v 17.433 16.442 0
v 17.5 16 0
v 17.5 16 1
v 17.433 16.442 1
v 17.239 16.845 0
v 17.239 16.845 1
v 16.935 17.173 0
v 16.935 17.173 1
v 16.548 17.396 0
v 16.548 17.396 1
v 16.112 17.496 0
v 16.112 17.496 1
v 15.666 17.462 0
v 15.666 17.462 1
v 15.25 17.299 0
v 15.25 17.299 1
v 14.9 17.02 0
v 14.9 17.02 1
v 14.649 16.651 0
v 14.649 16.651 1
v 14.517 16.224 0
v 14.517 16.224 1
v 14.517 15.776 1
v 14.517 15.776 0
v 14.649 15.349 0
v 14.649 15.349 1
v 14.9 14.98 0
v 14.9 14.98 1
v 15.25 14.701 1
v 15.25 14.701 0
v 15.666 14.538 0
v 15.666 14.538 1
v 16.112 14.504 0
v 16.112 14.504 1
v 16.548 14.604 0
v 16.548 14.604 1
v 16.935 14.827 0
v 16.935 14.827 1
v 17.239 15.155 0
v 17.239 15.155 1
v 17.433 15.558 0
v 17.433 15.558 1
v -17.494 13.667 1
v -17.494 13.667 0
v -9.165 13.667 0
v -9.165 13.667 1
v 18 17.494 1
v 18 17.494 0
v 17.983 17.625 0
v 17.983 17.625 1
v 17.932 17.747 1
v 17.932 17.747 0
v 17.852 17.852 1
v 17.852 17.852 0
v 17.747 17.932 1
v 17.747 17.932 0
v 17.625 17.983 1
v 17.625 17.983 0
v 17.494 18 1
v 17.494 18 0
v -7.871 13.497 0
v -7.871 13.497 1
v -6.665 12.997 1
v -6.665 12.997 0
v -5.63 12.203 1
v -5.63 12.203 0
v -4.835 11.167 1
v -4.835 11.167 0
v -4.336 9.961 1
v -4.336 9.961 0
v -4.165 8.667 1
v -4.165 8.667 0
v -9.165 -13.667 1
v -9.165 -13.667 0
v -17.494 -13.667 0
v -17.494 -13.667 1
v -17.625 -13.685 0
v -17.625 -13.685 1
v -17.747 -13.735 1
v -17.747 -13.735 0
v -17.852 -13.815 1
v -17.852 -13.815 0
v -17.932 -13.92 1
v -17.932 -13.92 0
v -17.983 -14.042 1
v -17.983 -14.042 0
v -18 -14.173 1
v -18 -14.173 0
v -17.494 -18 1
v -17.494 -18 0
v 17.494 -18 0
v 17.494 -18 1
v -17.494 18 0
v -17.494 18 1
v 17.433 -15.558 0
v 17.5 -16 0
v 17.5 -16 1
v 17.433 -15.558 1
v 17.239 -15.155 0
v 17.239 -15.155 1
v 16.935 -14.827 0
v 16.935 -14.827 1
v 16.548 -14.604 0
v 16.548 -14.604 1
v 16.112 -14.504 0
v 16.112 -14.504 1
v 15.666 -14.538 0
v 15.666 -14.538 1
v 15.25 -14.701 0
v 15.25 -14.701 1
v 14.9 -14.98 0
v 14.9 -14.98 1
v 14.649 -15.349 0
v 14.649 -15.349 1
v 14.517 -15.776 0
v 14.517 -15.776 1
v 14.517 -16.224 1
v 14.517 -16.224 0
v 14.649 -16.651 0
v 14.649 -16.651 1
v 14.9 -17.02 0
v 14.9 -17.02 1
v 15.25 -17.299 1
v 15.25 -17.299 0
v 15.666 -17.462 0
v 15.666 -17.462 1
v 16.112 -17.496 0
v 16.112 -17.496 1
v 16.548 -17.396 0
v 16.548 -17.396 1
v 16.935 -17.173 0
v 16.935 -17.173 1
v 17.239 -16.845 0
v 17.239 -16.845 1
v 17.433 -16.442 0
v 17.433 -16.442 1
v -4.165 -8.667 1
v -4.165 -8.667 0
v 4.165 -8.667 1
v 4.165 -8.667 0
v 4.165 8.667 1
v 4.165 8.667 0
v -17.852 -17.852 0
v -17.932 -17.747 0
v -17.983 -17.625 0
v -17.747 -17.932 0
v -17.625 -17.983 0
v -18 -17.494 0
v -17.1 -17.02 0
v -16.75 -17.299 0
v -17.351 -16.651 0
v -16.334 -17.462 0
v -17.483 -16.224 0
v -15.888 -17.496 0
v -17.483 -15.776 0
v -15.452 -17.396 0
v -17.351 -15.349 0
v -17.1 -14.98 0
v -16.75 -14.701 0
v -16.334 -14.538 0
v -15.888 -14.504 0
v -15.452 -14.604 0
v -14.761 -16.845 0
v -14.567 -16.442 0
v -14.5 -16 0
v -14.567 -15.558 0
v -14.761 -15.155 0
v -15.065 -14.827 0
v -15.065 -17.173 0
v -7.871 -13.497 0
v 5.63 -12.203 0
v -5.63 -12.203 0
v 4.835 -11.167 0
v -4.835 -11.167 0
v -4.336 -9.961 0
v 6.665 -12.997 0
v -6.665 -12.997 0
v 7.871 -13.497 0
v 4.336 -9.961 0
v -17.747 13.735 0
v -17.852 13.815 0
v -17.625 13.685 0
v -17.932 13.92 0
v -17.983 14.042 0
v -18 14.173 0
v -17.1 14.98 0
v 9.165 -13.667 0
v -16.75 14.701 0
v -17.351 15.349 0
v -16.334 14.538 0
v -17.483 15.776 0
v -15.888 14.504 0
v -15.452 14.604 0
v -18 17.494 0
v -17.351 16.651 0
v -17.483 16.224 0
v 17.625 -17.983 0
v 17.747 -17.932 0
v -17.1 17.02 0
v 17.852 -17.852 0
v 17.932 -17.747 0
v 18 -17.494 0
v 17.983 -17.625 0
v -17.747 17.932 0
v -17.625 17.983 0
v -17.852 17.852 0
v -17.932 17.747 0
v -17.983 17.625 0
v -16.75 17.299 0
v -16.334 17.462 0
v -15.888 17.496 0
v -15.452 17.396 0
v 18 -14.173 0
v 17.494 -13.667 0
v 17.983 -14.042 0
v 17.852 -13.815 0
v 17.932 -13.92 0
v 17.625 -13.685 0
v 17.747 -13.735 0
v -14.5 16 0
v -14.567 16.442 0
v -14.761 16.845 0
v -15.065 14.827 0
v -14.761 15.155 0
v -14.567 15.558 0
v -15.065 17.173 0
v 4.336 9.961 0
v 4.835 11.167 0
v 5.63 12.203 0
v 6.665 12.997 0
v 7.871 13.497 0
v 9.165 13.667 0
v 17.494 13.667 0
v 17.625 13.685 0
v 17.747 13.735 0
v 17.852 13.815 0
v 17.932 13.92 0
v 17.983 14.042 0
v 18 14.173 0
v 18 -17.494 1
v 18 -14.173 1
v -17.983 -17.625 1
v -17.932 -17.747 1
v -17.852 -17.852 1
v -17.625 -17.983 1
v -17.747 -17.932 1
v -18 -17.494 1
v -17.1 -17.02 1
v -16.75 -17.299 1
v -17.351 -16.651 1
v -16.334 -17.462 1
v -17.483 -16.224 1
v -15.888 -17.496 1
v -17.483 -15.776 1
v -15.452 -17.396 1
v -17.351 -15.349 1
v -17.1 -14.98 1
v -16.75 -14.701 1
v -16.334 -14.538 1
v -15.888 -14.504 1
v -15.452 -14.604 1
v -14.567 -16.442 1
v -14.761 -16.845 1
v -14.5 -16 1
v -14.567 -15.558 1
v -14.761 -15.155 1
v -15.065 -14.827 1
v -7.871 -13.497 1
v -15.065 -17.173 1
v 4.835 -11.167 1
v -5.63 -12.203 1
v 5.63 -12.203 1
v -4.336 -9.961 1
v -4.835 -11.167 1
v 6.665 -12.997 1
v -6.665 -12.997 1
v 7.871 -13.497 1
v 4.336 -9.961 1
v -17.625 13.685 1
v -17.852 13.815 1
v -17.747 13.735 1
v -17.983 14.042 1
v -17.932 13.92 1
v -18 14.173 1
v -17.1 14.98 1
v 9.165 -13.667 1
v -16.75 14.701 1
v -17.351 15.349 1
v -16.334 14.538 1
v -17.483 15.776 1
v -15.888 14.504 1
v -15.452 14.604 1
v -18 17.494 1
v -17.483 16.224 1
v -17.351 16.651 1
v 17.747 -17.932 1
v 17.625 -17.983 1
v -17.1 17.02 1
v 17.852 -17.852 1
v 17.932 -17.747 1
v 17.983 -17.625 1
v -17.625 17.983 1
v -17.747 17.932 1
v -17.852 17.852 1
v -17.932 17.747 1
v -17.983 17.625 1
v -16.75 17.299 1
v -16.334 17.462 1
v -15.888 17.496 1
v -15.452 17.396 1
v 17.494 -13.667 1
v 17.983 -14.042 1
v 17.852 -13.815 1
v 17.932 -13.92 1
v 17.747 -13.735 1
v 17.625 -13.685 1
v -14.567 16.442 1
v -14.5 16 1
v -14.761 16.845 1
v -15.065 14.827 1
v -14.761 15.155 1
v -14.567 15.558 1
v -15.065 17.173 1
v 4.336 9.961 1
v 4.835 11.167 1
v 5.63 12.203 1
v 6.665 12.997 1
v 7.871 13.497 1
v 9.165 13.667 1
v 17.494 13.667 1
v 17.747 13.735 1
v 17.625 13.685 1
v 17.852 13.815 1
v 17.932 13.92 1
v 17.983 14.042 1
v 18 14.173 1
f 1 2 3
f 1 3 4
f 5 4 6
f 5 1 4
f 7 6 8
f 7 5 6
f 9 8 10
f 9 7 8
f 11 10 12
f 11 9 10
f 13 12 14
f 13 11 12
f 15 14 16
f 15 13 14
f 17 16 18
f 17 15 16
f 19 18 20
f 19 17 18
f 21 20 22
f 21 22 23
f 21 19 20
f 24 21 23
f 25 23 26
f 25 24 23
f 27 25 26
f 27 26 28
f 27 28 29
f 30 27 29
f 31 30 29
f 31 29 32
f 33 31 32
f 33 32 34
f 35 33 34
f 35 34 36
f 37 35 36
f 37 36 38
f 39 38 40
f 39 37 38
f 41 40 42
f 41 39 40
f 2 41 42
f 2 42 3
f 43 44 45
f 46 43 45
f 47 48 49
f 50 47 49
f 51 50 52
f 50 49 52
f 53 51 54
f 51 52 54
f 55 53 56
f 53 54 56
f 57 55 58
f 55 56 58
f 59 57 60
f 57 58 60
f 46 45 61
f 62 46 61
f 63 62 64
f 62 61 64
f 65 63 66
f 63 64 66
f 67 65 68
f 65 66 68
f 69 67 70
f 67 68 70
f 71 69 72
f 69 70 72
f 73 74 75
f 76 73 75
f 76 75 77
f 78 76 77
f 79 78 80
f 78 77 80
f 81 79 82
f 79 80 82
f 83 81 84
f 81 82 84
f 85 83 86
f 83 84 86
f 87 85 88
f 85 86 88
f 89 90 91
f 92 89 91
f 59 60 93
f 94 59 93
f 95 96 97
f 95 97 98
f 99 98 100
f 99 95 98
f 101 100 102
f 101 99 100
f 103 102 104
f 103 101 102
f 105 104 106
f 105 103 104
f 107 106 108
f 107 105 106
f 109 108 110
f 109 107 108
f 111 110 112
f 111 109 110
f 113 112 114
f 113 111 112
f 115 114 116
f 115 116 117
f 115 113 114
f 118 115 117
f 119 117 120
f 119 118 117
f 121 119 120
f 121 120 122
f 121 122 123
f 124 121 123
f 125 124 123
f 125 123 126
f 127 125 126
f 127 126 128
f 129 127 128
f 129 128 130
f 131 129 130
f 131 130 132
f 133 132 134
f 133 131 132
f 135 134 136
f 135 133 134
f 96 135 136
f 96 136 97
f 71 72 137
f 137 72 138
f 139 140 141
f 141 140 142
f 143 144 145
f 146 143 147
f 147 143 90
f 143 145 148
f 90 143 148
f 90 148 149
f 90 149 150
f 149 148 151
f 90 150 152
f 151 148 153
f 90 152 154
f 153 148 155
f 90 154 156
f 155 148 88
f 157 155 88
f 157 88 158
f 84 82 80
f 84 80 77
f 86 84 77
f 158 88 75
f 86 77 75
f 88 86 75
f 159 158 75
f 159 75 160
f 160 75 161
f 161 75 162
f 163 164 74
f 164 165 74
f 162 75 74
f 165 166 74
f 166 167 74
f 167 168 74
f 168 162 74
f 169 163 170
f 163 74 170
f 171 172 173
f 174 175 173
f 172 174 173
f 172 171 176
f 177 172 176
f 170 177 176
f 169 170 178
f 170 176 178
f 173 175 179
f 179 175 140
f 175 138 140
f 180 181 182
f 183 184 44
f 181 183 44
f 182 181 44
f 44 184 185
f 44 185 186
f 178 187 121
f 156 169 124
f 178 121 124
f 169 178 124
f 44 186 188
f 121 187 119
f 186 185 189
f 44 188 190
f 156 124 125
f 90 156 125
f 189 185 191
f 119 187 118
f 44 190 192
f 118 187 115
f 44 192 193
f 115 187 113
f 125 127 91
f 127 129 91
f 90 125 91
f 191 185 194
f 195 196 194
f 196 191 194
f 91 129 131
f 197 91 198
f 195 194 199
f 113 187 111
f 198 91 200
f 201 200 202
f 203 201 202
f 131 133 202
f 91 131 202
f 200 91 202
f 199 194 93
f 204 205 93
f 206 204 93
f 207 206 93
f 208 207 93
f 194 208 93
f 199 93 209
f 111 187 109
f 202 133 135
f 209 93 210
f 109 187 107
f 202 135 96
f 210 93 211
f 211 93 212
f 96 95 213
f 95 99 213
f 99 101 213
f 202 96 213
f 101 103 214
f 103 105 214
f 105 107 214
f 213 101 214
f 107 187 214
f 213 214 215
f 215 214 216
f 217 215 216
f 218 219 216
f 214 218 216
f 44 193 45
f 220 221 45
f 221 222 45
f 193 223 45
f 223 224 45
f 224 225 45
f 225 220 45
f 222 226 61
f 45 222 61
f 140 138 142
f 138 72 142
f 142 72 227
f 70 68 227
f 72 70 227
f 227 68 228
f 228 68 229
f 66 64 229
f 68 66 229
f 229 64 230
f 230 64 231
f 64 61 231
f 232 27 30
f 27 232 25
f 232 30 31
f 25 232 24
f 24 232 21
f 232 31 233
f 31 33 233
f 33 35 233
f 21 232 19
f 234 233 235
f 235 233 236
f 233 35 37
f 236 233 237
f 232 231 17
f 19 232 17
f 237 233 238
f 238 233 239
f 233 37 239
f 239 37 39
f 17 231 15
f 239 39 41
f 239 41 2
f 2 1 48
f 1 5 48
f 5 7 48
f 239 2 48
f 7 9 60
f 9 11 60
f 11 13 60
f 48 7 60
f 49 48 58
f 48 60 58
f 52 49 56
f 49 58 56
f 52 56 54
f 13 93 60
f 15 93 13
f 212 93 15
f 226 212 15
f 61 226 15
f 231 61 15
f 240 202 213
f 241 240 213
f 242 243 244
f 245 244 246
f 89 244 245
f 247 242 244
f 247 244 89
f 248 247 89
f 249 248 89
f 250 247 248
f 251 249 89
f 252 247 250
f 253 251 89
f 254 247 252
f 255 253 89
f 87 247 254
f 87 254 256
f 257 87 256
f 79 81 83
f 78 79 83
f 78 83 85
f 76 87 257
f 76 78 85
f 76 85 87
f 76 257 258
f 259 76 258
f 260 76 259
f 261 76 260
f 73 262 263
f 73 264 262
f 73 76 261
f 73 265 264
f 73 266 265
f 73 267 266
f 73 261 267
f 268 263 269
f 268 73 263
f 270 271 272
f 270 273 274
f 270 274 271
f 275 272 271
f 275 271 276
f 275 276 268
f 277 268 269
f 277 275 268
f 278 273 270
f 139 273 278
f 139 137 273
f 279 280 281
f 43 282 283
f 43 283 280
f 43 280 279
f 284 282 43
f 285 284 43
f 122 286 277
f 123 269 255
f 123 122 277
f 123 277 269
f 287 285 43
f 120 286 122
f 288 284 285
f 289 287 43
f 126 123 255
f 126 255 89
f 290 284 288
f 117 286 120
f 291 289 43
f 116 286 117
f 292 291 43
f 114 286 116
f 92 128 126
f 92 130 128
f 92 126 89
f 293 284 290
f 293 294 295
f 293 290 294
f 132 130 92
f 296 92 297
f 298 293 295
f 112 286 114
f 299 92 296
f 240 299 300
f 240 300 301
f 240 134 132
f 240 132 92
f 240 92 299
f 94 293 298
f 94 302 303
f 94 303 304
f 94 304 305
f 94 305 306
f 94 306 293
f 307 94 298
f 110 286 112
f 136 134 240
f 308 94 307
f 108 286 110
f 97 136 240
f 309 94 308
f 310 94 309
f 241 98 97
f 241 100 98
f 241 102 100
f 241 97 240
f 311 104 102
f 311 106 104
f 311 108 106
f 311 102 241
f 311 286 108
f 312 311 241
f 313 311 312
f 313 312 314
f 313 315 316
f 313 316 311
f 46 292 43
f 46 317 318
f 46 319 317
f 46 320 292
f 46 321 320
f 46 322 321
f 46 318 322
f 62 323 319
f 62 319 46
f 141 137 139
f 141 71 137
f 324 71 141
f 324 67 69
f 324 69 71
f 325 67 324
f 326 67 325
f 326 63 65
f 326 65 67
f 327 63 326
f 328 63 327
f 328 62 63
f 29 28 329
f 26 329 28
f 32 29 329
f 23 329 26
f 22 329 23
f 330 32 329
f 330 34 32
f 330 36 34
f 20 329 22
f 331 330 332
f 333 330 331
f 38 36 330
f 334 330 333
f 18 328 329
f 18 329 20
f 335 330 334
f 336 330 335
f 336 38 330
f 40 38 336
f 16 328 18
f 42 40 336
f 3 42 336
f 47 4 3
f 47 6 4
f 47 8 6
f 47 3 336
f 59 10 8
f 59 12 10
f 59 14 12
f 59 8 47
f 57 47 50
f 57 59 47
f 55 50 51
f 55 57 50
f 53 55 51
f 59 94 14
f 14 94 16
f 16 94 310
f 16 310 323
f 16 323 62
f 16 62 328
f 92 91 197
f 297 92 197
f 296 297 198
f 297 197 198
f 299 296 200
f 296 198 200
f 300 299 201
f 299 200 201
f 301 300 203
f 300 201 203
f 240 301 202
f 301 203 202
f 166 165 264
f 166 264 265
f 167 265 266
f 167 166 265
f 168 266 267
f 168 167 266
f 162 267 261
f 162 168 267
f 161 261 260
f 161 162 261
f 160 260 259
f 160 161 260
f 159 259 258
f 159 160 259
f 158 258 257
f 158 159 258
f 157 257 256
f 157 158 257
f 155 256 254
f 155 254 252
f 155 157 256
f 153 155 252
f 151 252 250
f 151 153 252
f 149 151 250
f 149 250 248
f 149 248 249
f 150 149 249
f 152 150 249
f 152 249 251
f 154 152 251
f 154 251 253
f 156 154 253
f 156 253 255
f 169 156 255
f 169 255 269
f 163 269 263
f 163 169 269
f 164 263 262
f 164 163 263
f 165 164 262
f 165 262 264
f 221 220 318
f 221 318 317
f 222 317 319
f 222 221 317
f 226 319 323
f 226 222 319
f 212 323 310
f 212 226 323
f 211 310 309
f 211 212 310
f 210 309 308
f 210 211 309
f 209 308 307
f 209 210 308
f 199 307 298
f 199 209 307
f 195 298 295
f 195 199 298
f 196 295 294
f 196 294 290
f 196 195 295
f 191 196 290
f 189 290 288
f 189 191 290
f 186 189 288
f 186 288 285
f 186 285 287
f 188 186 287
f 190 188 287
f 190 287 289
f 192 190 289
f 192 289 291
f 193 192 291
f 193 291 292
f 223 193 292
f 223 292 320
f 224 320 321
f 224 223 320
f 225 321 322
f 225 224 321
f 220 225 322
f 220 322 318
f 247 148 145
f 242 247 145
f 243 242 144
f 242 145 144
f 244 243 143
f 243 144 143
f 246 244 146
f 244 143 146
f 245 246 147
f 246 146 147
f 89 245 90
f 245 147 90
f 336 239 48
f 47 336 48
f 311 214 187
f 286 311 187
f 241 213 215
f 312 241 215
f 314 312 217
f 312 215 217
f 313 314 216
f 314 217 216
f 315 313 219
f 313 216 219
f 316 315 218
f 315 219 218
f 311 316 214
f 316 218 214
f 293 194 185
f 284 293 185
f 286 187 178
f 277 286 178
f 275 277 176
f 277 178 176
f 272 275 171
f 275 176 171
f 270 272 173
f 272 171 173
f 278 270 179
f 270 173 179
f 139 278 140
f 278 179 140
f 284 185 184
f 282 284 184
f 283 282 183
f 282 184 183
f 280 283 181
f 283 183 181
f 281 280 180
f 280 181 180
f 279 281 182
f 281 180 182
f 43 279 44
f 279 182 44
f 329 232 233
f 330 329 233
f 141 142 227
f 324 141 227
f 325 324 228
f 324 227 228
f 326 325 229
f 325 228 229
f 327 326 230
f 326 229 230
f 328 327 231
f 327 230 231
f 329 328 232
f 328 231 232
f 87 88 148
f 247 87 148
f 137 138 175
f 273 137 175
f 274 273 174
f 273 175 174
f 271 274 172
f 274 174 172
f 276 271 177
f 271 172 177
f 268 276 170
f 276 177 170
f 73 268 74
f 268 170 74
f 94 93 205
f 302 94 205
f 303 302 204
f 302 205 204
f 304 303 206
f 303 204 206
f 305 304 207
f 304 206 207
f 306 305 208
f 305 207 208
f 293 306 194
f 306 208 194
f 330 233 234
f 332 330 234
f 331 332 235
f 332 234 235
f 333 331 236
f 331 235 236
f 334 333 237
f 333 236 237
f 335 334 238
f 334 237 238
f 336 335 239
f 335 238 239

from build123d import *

# Parameters (mm, degrees)
F0_R     = 1.5
F1_DEPTH = 1


with BuildPart() as f1:
    # F0 (on Top) → F1 (new body)
    with BuildSketch(Plane.XY):
        with BuildLine():
            Line((-17.494214, -18), (17.494214, -18))
            ThreePointArc((17.494214, -18), (17.851859, -17.851859), (18, -17.494214))
            Line((18, -17.494214), (18, -14.173142))
            ThreePointArc((18, -14.173142), (17.851859, -13.815498), (17.494214, -13.667356))
            Line((17.494214, -13.667356), (9.165291, -13.667356))
            ThreePointArc((9.165291, -13.667356), (5.629757, -12.20289), (4.165291, -8.667356))
            Line((4.165291, -8.667356), (4.165291, 8.667356))
            ThreePointArc((4.165291, 8.667356), (5.629757, 12.20289), (9.165291, 13.667356))
            Line((9.165291, 13.667356), (17.494214, 13.667356))
            ThreePointArc((17.494214, 13.667356), (17.851859, 13.815498), (18, 14.173142))
            Line((18, 14.173142), (18, 17.494214))
            ThreePointArc((18, 17.494214), (17.851859, 17.851859), (17.494214, 18))
            Line((17.494214, 18), (-17.494214, 18))
            ThreePointArc((-17.494214, 18), (-17.851859, 17.851859), (-18, 17.494214))
            Line((-18, 17.494214), (-18, 14.173142))
            ThreePointArc((-18, 14.173142), (-17.851859, 13.815498), (-17.494214, 13.667356))
            Line((-17.494214, 13.667356), (-9.165291, 13.667356))
            ThreePointArc((-9.165291, 13.667356), (-5.629757, 12.20289), (-4.165291, 8.667356))
            Line((-4.165291, 8.667356), (-4.165291, -8.667356))
            ThreePointArc((-4.165291, -8.667356), (-5.629757, -12.20289), (-9.165291, -13.667356))
            Line((-9.165291, -13.667356), (-17.494214, -13.667356))
            ThreePointArc((-17.494214, -13.667356), (-17.851859, -13.815498), (-18, -14.173142))
            Line((-18, -14.173142), (-18, -17.494214))
            ThreePointArc((-18, -17.494214), (-17.851859, -17.851859), (-17.494214, -18))
        make_face()
        with Locations((-16, -16)):
            Circle(F0_R, mode=Mode.SUBTRACT)
        with Locations((16, -16)):
            Circle(F0_R, mode=Mode.SUBTRACT)
        with Locations((-16, 16)):
            Circle(F0_R, mode=Mode.SUBTRACT)
        with Locations((16, 16)):
            Circle(F0_R, mode=Mode.SUBTRACT)
    extrude(amount=F1_DEPTH)


solid = f1.part
